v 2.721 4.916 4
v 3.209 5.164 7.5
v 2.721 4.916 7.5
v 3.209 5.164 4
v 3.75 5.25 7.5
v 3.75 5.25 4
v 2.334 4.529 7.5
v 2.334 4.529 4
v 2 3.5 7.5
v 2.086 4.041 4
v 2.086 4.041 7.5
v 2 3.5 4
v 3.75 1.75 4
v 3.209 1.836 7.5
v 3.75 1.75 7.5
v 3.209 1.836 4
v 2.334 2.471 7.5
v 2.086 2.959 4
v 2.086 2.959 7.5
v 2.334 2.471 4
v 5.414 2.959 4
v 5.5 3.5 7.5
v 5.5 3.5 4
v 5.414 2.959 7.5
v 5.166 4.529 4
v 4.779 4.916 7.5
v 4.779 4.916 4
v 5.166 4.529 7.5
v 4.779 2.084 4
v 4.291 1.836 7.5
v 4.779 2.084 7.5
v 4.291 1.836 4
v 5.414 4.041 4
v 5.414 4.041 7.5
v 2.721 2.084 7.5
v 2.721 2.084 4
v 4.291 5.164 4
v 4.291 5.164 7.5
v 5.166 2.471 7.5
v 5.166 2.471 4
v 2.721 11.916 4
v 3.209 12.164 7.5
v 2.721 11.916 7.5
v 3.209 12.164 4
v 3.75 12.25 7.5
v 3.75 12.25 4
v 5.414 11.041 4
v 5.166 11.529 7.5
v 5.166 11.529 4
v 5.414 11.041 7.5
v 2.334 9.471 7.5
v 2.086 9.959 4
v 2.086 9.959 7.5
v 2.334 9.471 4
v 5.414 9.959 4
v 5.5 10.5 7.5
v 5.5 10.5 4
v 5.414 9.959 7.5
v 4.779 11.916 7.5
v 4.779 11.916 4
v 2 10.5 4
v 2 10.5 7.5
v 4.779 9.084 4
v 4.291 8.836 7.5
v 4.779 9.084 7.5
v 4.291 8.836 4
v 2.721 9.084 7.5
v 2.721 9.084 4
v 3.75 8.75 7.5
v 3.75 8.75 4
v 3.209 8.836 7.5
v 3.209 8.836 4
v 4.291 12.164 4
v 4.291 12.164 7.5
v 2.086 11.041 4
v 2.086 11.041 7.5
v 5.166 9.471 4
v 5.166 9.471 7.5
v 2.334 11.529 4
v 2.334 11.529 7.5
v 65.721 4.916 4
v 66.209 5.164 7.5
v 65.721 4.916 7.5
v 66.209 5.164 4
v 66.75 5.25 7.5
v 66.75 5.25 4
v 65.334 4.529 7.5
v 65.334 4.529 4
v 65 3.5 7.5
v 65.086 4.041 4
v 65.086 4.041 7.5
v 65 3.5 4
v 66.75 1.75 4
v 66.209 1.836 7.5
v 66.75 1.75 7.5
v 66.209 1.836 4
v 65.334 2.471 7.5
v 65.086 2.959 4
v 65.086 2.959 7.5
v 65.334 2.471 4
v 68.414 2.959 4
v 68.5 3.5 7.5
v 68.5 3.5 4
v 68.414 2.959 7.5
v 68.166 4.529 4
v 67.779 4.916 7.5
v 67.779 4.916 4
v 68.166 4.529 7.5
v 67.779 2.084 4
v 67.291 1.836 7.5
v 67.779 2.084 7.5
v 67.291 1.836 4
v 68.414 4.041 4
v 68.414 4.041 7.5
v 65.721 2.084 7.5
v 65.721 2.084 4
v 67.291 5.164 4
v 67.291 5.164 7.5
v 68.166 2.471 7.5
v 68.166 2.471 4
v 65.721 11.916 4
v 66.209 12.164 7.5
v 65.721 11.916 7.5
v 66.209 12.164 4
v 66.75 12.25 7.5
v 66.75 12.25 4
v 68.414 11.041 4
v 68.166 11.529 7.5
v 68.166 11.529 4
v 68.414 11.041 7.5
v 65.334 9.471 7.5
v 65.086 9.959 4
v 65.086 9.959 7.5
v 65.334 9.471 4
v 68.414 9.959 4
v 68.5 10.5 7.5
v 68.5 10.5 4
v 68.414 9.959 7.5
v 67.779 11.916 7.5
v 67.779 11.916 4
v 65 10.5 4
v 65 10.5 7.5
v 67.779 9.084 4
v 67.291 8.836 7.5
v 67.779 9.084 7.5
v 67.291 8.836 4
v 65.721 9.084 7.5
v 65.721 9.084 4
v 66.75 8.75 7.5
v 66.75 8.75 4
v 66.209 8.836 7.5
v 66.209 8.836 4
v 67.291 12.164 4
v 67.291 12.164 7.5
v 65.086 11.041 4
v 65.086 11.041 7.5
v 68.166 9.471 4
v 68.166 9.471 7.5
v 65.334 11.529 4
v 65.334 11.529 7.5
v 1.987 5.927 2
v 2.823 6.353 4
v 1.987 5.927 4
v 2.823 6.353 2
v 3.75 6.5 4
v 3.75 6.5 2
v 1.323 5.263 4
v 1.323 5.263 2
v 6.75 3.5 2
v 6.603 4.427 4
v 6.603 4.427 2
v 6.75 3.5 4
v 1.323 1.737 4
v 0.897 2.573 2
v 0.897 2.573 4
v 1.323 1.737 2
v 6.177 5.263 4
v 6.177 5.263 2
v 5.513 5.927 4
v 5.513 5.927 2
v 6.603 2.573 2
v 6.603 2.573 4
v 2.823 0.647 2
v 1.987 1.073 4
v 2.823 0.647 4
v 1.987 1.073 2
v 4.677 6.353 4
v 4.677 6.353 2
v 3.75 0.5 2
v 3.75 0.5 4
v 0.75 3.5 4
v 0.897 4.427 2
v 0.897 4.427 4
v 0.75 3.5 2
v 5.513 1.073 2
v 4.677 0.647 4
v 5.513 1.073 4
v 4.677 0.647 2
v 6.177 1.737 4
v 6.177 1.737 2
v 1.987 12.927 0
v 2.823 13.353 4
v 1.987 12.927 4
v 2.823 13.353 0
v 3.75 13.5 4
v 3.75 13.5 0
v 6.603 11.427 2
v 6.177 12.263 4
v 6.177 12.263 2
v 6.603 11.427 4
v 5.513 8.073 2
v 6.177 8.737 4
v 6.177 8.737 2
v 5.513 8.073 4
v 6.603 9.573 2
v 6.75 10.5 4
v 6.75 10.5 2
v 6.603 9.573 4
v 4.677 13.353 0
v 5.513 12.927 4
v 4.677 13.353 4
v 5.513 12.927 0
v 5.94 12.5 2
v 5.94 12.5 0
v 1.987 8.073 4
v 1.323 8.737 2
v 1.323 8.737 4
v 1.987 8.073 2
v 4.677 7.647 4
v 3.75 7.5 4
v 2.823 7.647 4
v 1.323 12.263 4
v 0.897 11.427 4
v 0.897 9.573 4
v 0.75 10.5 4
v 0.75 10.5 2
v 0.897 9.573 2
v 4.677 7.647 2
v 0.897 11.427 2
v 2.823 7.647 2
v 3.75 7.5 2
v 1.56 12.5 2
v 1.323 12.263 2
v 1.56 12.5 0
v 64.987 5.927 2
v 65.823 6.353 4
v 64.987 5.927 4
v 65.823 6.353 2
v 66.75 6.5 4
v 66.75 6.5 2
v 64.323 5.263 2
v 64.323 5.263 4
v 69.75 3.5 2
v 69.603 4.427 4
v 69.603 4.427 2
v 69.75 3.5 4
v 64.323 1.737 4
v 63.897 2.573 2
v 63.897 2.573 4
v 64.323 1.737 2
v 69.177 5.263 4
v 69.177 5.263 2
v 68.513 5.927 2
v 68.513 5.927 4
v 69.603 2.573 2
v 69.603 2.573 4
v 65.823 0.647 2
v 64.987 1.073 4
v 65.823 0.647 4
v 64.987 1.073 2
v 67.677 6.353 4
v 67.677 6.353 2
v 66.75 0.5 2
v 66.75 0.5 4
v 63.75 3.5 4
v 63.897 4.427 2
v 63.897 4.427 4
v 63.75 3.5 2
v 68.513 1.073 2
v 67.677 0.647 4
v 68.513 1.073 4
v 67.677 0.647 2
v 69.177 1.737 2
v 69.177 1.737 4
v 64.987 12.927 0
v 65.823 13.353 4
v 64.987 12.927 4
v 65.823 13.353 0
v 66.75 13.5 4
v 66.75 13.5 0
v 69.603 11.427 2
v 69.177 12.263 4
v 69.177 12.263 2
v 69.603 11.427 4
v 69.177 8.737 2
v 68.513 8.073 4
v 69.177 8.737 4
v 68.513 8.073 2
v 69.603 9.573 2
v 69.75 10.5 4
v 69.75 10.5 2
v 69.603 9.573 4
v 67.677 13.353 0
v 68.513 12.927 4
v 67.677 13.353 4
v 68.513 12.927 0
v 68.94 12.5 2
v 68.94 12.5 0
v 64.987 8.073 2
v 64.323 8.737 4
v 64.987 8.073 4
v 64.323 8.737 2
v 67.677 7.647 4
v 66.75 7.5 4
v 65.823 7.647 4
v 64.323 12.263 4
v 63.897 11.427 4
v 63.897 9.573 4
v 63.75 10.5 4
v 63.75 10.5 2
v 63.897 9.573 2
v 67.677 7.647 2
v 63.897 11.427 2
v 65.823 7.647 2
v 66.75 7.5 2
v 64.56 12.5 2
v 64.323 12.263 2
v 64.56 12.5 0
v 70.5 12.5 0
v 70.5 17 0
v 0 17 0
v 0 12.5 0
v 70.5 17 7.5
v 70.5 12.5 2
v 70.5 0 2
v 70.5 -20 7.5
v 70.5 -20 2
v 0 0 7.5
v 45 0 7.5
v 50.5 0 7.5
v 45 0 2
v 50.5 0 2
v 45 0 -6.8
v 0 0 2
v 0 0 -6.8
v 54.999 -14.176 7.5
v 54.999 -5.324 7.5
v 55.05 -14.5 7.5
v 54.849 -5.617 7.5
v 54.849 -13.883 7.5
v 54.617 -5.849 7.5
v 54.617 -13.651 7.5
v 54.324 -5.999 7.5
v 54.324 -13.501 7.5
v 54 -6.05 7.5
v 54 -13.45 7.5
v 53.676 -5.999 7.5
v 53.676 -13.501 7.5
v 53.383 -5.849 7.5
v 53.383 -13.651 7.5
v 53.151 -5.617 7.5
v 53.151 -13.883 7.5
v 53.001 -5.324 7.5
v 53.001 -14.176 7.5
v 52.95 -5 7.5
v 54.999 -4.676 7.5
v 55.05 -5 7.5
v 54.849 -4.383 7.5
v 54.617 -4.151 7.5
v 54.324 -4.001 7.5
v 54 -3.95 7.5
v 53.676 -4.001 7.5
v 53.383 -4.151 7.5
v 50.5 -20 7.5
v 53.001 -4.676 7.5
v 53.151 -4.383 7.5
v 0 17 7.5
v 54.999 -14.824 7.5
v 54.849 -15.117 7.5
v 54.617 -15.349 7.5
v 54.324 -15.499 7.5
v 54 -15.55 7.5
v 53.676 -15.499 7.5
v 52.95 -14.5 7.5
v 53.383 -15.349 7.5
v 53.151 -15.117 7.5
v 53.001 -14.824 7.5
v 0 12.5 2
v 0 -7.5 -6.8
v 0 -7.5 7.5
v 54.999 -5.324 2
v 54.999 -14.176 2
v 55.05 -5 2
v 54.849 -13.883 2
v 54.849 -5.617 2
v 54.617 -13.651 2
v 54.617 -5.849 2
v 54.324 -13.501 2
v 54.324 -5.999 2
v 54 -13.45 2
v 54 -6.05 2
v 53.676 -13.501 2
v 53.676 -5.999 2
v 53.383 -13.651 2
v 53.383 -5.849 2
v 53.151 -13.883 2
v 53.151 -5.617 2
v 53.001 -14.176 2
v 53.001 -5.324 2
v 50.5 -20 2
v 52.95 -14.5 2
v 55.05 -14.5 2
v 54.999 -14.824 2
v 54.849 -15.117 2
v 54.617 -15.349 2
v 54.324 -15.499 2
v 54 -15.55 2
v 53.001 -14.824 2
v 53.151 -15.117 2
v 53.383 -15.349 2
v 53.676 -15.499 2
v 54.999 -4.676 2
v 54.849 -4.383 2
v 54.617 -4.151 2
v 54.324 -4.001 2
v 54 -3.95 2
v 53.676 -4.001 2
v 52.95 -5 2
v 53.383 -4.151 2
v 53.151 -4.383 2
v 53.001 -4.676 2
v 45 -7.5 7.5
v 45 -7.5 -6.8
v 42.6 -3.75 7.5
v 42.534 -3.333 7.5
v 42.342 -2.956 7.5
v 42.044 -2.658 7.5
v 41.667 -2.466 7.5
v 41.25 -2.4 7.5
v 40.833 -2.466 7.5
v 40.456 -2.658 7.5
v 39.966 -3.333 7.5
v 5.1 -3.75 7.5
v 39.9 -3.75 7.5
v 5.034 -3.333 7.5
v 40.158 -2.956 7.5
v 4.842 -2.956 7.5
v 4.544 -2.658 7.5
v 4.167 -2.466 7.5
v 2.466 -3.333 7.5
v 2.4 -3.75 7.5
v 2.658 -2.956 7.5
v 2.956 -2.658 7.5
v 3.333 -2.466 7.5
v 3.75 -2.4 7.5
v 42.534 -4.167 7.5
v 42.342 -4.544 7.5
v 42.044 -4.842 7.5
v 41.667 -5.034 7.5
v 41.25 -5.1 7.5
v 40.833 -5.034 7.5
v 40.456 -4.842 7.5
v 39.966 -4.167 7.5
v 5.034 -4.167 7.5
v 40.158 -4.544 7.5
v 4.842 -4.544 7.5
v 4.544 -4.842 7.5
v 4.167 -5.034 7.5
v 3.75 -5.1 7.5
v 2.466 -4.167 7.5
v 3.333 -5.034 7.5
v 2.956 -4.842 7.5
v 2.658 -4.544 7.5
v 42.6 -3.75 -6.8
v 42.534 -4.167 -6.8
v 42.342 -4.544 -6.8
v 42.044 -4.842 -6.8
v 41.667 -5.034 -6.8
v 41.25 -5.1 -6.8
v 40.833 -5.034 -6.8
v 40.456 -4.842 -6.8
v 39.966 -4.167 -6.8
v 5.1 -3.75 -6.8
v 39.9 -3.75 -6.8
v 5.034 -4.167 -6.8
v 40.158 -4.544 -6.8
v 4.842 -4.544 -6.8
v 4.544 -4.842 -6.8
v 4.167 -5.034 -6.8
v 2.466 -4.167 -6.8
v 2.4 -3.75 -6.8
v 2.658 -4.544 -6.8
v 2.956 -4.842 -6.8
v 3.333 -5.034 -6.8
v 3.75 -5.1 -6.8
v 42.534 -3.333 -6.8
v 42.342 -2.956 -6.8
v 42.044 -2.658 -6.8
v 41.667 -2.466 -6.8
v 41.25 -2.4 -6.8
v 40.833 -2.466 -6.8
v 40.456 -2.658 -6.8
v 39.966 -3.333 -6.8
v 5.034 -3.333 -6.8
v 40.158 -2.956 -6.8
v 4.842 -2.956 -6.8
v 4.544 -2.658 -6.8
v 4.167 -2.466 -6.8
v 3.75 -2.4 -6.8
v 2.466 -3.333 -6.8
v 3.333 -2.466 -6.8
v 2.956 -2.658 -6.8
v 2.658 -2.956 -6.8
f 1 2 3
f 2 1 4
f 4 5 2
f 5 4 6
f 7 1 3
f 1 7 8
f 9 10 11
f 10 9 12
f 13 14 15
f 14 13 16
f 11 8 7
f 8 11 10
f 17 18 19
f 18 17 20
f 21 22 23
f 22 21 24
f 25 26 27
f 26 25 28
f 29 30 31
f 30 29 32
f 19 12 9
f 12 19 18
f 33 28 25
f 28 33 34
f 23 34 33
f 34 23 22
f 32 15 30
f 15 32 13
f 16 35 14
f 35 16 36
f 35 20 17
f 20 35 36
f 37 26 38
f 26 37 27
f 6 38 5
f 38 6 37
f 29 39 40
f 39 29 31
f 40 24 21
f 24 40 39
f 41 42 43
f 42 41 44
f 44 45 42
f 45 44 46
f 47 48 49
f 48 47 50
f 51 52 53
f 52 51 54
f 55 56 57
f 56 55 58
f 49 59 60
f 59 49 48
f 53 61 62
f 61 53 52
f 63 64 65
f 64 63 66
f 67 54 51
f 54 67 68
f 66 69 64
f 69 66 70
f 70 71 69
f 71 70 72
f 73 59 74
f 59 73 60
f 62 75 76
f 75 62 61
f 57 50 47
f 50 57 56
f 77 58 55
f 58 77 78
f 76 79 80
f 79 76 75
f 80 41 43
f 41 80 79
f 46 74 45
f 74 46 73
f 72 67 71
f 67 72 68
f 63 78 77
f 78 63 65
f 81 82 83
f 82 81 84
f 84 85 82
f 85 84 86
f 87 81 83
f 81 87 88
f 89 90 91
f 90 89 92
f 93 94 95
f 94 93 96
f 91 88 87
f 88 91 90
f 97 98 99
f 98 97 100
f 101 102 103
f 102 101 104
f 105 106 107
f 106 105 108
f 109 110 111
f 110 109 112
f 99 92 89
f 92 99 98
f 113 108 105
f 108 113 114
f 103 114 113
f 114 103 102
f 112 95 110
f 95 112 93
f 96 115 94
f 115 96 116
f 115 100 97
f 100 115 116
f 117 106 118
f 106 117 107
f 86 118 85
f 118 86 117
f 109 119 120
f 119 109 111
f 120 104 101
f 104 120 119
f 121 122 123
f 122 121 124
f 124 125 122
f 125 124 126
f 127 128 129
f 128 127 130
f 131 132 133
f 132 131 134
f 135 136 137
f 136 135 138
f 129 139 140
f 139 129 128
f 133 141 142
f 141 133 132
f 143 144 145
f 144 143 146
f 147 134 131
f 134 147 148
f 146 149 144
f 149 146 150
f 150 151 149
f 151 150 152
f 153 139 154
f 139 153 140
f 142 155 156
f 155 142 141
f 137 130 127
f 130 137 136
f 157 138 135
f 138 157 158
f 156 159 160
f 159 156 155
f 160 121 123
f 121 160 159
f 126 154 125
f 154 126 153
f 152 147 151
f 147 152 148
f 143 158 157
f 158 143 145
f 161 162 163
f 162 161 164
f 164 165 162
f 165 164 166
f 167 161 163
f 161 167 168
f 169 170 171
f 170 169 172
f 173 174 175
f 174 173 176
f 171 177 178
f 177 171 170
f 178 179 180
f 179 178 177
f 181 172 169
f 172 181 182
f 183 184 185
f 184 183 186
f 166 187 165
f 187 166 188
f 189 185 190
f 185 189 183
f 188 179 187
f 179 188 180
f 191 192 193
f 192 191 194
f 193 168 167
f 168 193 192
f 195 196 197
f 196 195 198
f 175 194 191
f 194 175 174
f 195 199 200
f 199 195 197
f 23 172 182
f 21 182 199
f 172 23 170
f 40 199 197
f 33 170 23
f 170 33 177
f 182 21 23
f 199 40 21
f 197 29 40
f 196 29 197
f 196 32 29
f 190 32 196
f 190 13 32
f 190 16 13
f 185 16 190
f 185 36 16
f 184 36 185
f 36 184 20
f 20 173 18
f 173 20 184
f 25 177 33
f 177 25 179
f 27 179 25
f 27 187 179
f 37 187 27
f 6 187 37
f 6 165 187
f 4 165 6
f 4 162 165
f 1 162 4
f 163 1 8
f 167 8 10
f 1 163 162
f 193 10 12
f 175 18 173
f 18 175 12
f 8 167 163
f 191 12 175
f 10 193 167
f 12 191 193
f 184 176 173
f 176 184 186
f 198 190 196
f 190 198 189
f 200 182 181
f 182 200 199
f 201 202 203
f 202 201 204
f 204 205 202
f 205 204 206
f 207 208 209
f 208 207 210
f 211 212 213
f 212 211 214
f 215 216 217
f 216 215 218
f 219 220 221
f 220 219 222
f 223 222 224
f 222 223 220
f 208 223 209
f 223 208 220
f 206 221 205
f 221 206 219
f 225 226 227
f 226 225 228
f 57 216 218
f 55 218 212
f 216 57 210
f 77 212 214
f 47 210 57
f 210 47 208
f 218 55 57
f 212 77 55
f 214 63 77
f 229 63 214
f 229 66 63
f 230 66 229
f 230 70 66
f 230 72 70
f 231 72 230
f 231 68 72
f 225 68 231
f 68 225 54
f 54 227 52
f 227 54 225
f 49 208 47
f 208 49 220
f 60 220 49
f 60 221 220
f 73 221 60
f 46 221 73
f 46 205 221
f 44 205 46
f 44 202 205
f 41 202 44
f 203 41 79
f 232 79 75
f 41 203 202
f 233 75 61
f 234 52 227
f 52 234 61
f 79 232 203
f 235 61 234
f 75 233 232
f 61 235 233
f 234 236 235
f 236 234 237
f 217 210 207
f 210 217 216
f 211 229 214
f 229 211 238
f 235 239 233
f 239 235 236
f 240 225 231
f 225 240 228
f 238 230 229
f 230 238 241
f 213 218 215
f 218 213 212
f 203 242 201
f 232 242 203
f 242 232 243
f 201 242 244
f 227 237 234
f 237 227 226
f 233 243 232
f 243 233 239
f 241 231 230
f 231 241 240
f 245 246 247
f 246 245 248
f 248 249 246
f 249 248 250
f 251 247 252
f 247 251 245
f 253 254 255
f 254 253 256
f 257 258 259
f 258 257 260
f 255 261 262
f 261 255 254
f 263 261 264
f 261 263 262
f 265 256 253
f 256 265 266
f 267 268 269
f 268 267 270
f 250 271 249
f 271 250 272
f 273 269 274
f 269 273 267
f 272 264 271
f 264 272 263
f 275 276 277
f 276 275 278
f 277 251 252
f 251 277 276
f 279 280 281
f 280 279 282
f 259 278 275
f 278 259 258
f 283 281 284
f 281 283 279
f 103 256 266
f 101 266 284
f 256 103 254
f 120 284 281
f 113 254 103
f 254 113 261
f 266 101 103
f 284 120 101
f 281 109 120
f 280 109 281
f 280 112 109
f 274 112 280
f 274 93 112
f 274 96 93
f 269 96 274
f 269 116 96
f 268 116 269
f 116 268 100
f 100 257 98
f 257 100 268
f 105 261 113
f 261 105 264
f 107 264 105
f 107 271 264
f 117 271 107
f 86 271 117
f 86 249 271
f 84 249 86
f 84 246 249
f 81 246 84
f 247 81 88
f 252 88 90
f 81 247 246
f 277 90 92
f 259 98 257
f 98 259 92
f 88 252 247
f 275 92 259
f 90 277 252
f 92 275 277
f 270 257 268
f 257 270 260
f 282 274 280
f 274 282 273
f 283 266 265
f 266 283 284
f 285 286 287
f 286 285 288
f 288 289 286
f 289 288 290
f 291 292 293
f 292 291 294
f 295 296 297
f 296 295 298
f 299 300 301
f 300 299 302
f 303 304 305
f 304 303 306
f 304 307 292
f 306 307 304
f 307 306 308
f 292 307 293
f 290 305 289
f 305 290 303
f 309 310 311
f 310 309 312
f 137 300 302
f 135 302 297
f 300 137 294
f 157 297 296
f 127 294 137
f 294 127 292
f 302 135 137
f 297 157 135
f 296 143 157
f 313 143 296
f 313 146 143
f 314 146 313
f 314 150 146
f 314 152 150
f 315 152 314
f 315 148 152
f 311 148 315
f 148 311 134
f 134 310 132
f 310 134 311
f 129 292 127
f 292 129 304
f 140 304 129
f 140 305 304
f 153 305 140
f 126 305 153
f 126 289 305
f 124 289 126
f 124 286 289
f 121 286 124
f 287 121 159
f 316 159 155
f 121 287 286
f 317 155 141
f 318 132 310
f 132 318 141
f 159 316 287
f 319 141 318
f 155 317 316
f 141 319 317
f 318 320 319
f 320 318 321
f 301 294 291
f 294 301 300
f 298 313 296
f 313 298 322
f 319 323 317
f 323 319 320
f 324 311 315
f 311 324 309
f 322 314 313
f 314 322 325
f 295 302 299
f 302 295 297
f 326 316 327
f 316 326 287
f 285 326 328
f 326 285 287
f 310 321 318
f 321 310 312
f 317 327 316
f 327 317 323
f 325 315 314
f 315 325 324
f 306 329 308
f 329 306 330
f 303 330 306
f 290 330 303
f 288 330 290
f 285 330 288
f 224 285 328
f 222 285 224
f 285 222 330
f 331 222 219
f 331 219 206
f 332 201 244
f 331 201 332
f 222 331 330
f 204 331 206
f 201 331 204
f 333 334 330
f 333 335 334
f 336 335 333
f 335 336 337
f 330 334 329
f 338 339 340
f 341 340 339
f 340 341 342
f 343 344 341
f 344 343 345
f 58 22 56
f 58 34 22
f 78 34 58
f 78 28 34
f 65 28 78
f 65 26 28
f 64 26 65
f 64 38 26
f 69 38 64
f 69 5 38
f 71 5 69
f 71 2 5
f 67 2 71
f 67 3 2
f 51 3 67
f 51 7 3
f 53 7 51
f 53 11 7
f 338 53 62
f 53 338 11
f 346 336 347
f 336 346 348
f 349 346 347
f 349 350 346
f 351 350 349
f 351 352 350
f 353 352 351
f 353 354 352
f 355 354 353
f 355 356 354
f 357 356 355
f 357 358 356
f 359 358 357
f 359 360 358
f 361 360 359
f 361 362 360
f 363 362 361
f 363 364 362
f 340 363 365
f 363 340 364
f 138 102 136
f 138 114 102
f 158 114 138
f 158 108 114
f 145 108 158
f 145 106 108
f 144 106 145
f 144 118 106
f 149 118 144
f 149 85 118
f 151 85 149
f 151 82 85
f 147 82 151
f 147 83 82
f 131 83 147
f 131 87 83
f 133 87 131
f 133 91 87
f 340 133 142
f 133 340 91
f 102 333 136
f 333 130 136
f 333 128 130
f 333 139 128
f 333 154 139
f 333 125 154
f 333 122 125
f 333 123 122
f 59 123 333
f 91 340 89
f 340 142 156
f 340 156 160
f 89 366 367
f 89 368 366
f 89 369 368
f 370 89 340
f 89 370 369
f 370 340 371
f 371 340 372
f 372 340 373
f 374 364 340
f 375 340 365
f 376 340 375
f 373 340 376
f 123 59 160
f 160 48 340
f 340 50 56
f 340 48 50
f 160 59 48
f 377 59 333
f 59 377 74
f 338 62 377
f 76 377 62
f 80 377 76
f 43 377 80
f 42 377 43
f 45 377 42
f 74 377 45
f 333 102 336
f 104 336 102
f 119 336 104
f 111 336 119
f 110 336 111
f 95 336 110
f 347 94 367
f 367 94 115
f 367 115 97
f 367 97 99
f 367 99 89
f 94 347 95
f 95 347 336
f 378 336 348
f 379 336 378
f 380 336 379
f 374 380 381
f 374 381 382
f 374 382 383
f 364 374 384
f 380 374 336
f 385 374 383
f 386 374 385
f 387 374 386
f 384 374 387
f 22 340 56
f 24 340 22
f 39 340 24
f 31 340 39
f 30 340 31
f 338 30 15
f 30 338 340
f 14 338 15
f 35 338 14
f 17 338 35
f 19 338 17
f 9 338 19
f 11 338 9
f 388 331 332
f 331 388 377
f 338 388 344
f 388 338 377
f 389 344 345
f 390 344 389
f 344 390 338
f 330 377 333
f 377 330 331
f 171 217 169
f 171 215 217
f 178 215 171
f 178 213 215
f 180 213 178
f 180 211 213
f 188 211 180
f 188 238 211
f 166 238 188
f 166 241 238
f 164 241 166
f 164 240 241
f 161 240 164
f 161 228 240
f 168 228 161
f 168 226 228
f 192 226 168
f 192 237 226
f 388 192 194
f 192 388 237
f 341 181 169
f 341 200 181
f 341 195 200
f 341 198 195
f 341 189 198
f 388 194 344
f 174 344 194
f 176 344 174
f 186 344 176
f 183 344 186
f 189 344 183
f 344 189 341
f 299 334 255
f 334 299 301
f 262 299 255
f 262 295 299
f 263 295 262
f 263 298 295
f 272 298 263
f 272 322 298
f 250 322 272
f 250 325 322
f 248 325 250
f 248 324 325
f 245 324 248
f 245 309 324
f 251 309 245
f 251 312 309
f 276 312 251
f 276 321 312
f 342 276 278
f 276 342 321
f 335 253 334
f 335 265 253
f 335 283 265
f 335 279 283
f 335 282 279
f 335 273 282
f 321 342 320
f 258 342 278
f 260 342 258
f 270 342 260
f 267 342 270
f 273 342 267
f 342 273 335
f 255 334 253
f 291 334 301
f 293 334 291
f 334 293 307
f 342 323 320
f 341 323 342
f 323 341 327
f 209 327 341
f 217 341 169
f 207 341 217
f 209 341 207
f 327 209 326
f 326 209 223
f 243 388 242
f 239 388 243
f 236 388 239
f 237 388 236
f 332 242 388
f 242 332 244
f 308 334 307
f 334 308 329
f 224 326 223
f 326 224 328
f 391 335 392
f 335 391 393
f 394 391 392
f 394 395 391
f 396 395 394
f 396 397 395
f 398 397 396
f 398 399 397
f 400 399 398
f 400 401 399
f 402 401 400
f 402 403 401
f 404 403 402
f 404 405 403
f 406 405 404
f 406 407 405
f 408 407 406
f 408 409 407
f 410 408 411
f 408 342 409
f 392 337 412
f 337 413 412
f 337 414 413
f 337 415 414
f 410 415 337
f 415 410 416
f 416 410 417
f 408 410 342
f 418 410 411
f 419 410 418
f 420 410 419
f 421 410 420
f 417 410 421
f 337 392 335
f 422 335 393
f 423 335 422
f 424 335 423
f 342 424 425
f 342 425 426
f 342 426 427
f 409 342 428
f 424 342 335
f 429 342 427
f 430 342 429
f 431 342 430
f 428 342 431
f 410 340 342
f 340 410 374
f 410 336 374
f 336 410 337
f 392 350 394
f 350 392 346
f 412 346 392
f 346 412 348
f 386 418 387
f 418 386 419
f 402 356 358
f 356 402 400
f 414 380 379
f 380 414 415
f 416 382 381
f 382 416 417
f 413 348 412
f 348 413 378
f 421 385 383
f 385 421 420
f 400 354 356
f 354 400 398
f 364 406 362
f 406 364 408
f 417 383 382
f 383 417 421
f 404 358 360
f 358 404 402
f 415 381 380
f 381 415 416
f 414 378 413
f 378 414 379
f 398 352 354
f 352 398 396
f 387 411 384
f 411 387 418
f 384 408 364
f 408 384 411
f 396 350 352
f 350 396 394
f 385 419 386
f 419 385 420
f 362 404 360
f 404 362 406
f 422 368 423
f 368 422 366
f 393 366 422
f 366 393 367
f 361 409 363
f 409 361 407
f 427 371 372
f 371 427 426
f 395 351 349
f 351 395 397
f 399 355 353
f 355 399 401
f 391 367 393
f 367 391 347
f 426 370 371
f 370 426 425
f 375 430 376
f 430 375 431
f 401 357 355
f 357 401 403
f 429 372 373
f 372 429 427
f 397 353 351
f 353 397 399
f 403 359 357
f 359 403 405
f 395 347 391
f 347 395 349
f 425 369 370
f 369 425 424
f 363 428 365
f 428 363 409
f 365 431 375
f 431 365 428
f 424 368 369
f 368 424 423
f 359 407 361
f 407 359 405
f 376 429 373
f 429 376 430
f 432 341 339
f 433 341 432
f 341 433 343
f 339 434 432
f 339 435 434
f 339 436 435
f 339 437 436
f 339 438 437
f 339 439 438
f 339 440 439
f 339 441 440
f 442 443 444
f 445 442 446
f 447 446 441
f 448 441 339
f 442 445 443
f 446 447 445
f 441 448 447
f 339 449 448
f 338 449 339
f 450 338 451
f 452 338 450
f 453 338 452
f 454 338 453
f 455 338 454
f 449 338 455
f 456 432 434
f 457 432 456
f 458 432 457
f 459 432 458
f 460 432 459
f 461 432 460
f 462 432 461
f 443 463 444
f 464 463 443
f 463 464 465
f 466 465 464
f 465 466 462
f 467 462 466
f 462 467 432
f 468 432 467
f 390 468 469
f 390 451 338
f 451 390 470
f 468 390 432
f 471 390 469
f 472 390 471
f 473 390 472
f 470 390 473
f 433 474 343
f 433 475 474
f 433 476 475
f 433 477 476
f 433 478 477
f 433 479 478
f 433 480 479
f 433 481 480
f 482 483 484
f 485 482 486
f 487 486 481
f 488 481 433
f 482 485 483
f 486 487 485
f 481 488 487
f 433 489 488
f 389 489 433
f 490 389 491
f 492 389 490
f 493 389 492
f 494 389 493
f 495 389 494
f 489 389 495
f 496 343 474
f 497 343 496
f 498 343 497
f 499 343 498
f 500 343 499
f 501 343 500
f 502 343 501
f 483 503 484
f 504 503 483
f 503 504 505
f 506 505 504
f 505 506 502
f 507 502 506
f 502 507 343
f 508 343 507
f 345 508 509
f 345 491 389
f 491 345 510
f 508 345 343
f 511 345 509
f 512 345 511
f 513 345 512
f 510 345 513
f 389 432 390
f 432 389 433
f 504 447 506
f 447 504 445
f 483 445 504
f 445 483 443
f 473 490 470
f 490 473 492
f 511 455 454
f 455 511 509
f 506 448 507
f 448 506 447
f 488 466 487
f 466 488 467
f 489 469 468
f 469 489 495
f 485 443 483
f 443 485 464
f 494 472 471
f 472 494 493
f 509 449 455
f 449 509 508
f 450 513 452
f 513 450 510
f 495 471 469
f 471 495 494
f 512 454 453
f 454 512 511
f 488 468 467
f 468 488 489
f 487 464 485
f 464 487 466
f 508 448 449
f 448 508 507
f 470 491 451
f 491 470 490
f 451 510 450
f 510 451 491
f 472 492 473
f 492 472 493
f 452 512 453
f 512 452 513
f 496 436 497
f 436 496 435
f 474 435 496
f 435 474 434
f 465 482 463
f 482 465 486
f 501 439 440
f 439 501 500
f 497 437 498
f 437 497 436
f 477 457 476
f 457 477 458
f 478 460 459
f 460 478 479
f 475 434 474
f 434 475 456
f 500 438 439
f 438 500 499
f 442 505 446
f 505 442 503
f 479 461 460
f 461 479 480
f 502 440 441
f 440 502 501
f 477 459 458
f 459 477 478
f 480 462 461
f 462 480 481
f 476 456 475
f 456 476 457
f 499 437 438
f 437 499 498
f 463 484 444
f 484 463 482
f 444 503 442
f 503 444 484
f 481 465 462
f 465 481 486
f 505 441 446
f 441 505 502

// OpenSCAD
function rel_to_abs(list, i = 0, sum = [0,0], result = []) = 
    i == len(list) ? result : rel_to_abs(list, i + 1, sum + list[i], concat(result, [sum + list[i]]));
    

module doubleHoles() {
cylinder(h = 20, r = 1.75, $fn=20);
translate([7,0,0]) cylinder(h = 20, r = 1.75, $fn=20);
}

module doubleHoles6mm() {
cylinder(h = 5, r = 3, $fn=20);
translate([7,0,0]) cylinder(h = 5, r = 3, $fn=20);
}

difference() {
  linear_extrude(7.5) polygon(rel_to_abs([[0,0],[70.5,0],[0,17],[-70.5,0]]));

  rotate([0,0,90]) translate([3.5, -3.75, -1]) doubleHoles();
  rotate([0,0,90]) translate([3.5, -66.75, -1]) doubleHoles();
    
  rotate([0,0,90]) translate([3.5, -3.75, -1]) doubleHoles6mm();
  rotate([0,0,90]) translate([3.5, -66.75, -1]) doubleHoles6mm();
    
  linear_extrude(2) polygon(rel_to_abs([[0,0],[70.5,0],[0,12.5],[-70.5,0]]));

}

translate([50.5,-20,2]) limit_switch_protrusion();
translate([0,-7.5,-6.8]) back();

module limit_switch_protrusion() {
    difference() {
        cube(size = [20,20,5.5]);
        translate([3.5,5.5,0]) cylinder(h = 20, r = 2.1/2, $fn=20);
        translate([3.5,15,0]) cylinder(h = 20, r = 2.1/2, $fn=20);

    }
}

module back() {
    difference() {
        cube(size = [45,7.5,14.3]);
        translate([3.75,3.75,0]) cylinder(h = 20, r = 2.7/2, $fn=20);
        translate([41.25,3.75,0]) cylinder(h = 20, r = 2.7/2, $fn=20);

    }
}
